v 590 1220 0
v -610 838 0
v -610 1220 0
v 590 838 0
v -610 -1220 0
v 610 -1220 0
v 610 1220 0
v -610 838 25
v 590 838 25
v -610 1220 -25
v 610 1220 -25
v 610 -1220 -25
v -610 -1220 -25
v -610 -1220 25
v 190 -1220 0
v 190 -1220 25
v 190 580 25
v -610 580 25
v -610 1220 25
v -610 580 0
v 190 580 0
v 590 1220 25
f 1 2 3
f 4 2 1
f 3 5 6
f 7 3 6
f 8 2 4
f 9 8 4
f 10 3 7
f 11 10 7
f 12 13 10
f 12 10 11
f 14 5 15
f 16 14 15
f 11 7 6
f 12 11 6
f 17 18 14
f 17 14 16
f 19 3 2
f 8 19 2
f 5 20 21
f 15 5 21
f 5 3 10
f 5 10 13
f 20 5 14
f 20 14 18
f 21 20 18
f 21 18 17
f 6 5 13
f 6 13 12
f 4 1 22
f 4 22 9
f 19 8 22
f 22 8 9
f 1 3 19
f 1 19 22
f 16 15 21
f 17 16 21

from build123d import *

# Parameters (mm, degrees)
F0_W     = 800
F0_H     = 1800
F1_DEPTH = 25
F2_W     = 1200
F2_H     = 382
F3_DEPTH = 25
F4_W     = 1220
F4_H     = 2440
F5_DEPTH = 25


with BuildPart() as f1:
    # F0 (on Top) → F1 (new body)
    with BuildSketch(Plane.XY):
        with Locations((-210, -320)):
            Rectangle(F0_W, F0_H)
    extrude(amount=F1_DEPTH)


with BuildPart() as f3:
    # F2 (on face) → F3 (new body)
    with BuildSketch(Plane(origin=(0, 0, 0), x_dir=(1, 0, 0), z_dir=(0, 0, -1))):
        with Locations((-10, -1029)):
            Rectangle(F2_W, F2_H)
    extrude(amount=-F3_DEPTH)


with BuildPart() as f5:
    # F4 (on face) → F5 (new body)
    with BuildSketch(Plane(origin=(0, 0, 0), x_dir=(1, 0, 0), z_dir=(0, 0, -1))):
        Rectangle(F4_W, F4_H)
    extrude(amount=F5_DEPTH)


solid = Compound([f1.part, f3.part, f5.part])
